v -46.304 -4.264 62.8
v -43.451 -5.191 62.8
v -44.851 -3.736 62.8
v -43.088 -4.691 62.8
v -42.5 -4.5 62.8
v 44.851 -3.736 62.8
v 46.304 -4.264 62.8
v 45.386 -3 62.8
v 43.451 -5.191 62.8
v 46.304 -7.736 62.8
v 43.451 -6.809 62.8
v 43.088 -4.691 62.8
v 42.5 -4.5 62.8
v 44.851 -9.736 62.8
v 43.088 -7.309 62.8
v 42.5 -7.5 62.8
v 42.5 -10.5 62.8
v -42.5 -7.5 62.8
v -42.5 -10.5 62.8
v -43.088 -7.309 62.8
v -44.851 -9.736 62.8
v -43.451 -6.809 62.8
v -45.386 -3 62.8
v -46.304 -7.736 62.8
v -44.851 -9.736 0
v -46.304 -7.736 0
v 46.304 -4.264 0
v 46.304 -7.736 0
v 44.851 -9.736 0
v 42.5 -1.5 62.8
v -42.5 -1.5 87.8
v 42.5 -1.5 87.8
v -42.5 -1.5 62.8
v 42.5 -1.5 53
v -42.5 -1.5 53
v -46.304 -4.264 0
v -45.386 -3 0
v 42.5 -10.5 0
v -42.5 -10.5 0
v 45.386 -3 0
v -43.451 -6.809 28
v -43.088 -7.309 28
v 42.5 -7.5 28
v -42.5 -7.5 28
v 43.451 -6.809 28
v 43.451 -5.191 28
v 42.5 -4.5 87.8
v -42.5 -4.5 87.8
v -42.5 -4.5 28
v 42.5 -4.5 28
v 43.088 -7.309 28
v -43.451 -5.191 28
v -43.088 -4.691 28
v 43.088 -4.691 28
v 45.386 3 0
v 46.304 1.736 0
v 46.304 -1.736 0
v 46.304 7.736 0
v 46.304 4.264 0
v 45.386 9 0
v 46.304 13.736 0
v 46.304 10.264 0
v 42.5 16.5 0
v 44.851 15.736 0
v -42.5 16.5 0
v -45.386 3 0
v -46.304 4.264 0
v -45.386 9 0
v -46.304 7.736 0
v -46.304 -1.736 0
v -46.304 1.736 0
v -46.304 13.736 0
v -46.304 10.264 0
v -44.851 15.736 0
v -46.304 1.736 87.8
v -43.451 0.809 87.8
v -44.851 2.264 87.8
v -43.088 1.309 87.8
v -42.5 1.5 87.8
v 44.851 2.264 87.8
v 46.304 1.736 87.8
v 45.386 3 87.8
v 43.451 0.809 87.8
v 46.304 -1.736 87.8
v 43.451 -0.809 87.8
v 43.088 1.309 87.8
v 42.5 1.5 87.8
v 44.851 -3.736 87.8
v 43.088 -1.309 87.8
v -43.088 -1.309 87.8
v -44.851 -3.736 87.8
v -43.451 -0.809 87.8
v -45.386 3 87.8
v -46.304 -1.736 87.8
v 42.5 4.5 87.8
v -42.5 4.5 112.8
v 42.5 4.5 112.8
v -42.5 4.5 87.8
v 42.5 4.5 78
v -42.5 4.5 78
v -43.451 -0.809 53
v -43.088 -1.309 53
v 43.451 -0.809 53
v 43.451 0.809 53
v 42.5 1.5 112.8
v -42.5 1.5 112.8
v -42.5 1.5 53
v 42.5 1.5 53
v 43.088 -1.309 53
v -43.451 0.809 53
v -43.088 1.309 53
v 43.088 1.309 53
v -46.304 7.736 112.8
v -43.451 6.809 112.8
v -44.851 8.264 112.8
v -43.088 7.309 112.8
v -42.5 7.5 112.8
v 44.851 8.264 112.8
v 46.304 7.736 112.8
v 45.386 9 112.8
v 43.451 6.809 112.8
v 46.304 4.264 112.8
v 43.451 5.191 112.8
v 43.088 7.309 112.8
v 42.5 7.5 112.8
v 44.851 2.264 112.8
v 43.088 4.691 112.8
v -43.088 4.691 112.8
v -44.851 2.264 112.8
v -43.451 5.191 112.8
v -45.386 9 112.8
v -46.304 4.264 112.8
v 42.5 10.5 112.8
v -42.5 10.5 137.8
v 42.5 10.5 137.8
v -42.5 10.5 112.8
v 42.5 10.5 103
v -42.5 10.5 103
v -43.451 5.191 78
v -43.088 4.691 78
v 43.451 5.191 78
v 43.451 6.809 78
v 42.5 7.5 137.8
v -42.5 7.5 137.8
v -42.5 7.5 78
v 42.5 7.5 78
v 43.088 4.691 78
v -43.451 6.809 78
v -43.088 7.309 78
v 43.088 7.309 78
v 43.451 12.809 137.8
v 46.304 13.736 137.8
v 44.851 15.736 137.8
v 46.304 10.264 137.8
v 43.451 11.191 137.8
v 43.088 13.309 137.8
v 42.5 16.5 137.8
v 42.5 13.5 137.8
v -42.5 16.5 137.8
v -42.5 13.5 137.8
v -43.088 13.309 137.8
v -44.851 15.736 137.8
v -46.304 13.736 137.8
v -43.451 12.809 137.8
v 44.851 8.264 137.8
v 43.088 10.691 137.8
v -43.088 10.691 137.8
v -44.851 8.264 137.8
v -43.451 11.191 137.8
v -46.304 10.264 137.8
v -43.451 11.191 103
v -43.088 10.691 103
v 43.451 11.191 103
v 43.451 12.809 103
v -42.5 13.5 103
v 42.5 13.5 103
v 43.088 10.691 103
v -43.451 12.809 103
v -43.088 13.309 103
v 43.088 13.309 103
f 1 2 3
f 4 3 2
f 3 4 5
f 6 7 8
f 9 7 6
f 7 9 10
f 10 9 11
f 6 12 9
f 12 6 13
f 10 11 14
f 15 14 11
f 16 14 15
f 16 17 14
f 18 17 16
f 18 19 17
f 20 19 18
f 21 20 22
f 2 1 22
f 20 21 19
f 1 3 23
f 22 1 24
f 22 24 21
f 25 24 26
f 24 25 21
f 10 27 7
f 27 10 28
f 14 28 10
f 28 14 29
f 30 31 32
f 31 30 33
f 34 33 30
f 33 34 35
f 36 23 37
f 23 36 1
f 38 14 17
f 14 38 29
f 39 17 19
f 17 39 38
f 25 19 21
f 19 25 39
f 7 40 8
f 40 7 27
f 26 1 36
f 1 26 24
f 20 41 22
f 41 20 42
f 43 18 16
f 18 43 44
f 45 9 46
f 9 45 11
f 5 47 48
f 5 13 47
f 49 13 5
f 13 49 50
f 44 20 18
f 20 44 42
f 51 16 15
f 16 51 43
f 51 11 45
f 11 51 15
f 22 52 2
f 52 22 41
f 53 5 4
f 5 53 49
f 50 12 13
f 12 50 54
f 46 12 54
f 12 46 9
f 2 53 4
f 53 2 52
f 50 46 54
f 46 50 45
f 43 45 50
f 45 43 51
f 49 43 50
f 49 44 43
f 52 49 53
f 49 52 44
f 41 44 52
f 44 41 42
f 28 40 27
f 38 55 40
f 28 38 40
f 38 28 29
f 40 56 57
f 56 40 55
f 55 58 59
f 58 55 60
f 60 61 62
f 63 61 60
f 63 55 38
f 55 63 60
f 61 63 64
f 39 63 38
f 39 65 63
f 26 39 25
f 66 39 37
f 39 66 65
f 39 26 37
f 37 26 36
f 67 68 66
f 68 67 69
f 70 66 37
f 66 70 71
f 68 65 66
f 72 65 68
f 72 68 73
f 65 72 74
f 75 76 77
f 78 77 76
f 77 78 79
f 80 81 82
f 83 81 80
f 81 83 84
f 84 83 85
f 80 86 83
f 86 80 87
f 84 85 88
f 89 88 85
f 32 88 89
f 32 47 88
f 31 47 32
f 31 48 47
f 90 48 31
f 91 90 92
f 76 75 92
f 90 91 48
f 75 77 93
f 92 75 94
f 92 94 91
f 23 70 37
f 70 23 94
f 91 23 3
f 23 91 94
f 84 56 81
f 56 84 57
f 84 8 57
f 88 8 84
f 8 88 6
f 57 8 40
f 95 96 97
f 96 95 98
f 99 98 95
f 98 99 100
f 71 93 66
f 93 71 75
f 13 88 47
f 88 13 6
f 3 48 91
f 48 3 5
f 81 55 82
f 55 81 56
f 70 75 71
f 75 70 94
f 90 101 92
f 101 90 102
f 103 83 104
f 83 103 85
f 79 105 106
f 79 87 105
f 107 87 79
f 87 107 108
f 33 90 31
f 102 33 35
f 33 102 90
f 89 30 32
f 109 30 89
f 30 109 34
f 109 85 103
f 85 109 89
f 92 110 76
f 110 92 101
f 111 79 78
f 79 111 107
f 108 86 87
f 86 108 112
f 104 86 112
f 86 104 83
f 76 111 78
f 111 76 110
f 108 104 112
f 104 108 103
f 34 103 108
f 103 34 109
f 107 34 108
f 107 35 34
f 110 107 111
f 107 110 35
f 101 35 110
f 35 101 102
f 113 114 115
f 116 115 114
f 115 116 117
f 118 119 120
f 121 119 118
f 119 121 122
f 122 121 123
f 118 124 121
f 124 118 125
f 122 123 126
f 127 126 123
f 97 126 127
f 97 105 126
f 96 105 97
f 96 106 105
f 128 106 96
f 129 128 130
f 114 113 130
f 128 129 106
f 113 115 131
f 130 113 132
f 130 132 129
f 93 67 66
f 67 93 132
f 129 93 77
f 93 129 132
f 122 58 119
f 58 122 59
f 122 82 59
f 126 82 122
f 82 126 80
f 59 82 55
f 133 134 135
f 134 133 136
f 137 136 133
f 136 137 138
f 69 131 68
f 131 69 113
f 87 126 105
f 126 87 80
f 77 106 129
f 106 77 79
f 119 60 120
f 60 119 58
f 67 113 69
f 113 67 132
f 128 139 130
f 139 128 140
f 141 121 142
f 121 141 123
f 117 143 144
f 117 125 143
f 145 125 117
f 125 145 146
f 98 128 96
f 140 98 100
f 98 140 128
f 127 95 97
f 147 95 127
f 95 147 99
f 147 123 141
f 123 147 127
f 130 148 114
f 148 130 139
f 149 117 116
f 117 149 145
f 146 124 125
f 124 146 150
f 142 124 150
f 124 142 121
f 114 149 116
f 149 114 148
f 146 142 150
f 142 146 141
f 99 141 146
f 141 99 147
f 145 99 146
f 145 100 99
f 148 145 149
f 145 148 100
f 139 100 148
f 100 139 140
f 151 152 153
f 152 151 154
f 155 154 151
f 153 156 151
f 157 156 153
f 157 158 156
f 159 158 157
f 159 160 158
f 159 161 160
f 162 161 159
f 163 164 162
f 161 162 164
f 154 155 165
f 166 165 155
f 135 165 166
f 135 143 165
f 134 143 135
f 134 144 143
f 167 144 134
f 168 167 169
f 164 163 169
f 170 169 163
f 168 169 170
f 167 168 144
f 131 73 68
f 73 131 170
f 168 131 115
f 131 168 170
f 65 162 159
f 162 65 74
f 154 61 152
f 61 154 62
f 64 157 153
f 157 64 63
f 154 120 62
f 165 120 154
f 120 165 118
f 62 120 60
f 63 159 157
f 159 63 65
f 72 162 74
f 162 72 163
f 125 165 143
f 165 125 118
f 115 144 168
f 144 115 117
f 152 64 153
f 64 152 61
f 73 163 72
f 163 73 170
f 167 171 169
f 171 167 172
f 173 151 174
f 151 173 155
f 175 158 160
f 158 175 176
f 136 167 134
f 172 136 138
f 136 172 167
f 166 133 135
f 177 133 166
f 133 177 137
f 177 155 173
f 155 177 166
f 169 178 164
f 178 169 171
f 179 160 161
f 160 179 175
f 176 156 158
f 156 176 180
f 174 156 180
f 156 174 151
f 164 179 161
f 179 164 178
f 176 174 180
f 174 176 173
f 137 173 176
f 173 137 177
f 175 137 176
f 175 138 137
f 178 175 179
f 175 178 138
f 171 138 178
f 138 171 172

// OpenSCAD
/* https://edux.fit.cvut.cz/courses/BI-3DT/classification/openscad-ukol */
/* https://github.com/nesro/nesrotom-3dt-2015 */
/* nesrotom@fit.cvut.cz */

/* comment this out before submission! */
$fn = 10;

/******************************************************/

/* 1D offset wasn't a good idea */
/*
module line(x) {
    difference() {
    square([x,1],center=true);
    translate([0,0.5,0])
        square([x+0.5,2],center=true);
    }
}
offset(r=+3)
line(10);*/

/* rounded cube: square + offset + extrude */
/* tohle ale nemuzu pouzit, protoze to nefunguje kdyz je
   y = 0 */
module rcSOE(x,y,z,r) {
    echo("rcSOE x=",x,",\ty=",y,",\tz=",z,",\tr=",r);
    %cube([x+2*r,y+2*r,z], center=true);
    linear_extrude(height=z,center=true,convexity=0,twist=0)
    offset(r=+r)
    square([x,y],center=true);
}

/* rounded cube: 4 cylinders + hull */
module rc4CH(x,y,z,r) {
    echo("rc4CH x=",x,",\ty=",y,",\tz=",z,",\tr=",r);
    %cube([x+2*r,y+2*r,z], center=true);
    hull() {
        for (i=[-1,1])
            for (j=[-1,1])
                translate([(i*x/2),(j*y/2),0]) 
                    cylinder(r=r, h=z, center=true);
    }
}

/* rounded cube: 2 cylinders + cube (WIP!!!) */
module rc2CC(x,y,z,r) {
    echo("rc2CC x=",x,",\ty=",y,",\tz=",z,",\tr=",r);
    %cube([x+2*r,y+2*r,z], center=true);
    
    //d=z+r;
    //cylinder(r=d, h=z, center=true);
    
    cube([x+2*r,y,z], center=true);
    
    color("red")
    translate([0,x+2*r,0]) //FIXME
    cylinder(r=r, h=z, center=true);
    
}

module rc(x,y,z,r) {
    rc4CH(x,y,z,r);
}


/* one card holder */
module ch(x,y,z,s,t,down) {
    difference(){
        rc(z,x,y,s+t);
        rc(z,x,y,s);
    }
    translate([0,0,(-y/2) +t/2 - down/2])
    rc(z,x,t+down,s+t);
}

module draw_cardholder(x,y,z,t,s,c,d,v) {
    rotate([0,0,90]) //natoc aby  to bylo jako na eduxu
    translate([-(c*z+s+t+s+t),0,0]) //posun do prosted x
    for (a=[1:c]) { //pro kazdou kartu
        translate([a*t*2,0,a*d]) //pousun o delta
        translate([0,0,(y*v)/2]) //na osu z
        ch(x,y*v,z,s,t,a*d); //jeden drzacek na kartu
    }
}

module cardholder(
    size=[85, 54, 1],
    thickness=3,
    spacing=1,
    cards=4,
    delta=25,
    visibility=0.3)
{
    /* i wrote this code after a lot of updog */
    draw = (len(size) < 2 || size[0] <= 0 ||
            size[1] <= 0 || cards <= 0) ? false : true;
    visibility = (visibility < 0) ? 0 : visibility;
    visibility = (1 < visibility) ? 1 : visibility;
    thickness = (thickness < 0) ? 0 : thickness;
    spacing = (spacing < 0) ? 0 : spacing;
    size = len(size) == 2 ? concat(size, 0) : size;
        
    /* i need shortcuts because i have a small screen */
    x = size[0];
    y = size[1];
    z = size[2];   
    s = spacing;
    t = thickness;
    c = cards;
    d = delta;
    v = 1 - visibility;
    
    if (draw) {
        draw_cardholder(x,y,z,t,s,c,d,v);
    }
}

/******************************************************/
/* tests */
test_no = 1;

if (test_no == 1) {
    cardholder();
    echo("TEST #1: edux default <<<<<");
}

if (test_no == 2) {
    cardholder(size=[85, 54, 1], thickness=3, spacing=1, cards=4, delta=25, visibility=0.3);
    echo("TEST #2: edux default copied <<<<<");
}

if (test_no == 3) {
    cardholder(size=[90, 70, 4], thickness=3, spacing=1, cards=4, delta=25, visibility=0.3);
    echo("TEST #3: edux slightly different size <<<<<");
}

if (test_no == 4) {
    cardholder(size=[90, 70, 4], thickness=5, spacing=3, cards=6, delta=10, visibility=0.5);
    echo("TEST #4: edux slightly different size and rest <<<<<");
}

if (test_no == 5) {
    cardholder(size=[666], thickness=3, spacing=1, cards=4, delta=25, visibility=0.3);
    echo("TEST #5: vector has only 1 item <<<<<");
    echo("TEST #5: NOTHIG SHALL BE GENERATED! <<<<<");
}

if (test_no == 6) {
    cardholder(size=[85, 54], thickness=3, spacing=1, cards=4, delta=25, visibility=0.3);
    echo("TEST #6: vector has only 2 item <<<<<");
}

if (test_no == 7) {
    cardholder(size=[0, 54, 1], thickness=3, spacing=1, cards=4, delta=25, visibility=0.3);
    echo("TEST #7: size[0] == 0 <<<<<");
    echo("TEST #7: NOTHIG SHALL BE GENERATED! <<<<<");
}

if (test_no == 8) {
    cardholder(size=[85, 0, 1], thickness=3, spacing=1, cards=4, delta=25, visibility=0.3);
    echo("TEST #8: size[1] == 0 <<<<<");
    echo("TEST #8: NOTHIG SHALL BE GENERATED! <<<<<");
}

if (test_no == 9) {
    cardholder(size=[85, 54, 1], thickness=3, spacing=1, cards=0, delta=25, visibility=0.3);
    echo("TEST #9: cards == 0 <<<<<");
    echo("TEST #9: NOTHIG SHALL BE GENERATED! <<<<<");
}

if (test_no == 10) {
    cardholder(size=[85, 54, 1], thickness=3, spacing=-3, cards=4, delta=25, visibility=0.3);
    echo("TEST #10: spacing < 0 <<<<<");
}

if (test_no == 11) {
    cardholder(size=[85, 54, 1], thickness=3, spacing=1, cards=4, delta=0, visibility=0.3);
    echo("TEST #11: delta == 0 <<<<<");
}

if (test_no == 12) {
    cardholder(size=[85, 54, 1], thickness=3, spacing=1, cards=4, delta=-5, visibility=0.3);
    echo("TEST #12: delta == -5 <<<<<");
    echo("TEST #12: FIXME: negeneruju dno <<<<<");
}

if (test_no == 13) {
    cardholder(size=[85, 54, 1], thickness=3, spacing=1, cards=4, delta=25, visibility=-2);
    echo("TEST #13: visibility = -2 <<<<<");
    echo("TEST #13: FIXME: tohle ma mit maximalni diru, ja nemam zadnou :D <<<<<");
}

if (test_no == 14) {
    cardholder(size=[85, 54, 1], thickness=3, spacing=1, cards=4, delta=25, visibility=2);
    echo("TEST #14: visibility = 2 <<<<<");
    echo("TEST #14: FIXME: tohle ma mit malou dirku, ja mam docela velkou <<<<<");
}

if (test_no == 15) {
    cardholder(size=[85, 54, 1], thickness=3, spacing=1, cards=1, delta=25, visibility=0.3);
    echo("TEST #15: only 1 card <<<<<");
}

if (test_no == 15) {
    cardholder(size=[85, 54, 1], thickness=3, spacing=10, cards=1, delta=25, visibility=0.3);
    echo("TEST #15: 10 cards <<<<<");
}
